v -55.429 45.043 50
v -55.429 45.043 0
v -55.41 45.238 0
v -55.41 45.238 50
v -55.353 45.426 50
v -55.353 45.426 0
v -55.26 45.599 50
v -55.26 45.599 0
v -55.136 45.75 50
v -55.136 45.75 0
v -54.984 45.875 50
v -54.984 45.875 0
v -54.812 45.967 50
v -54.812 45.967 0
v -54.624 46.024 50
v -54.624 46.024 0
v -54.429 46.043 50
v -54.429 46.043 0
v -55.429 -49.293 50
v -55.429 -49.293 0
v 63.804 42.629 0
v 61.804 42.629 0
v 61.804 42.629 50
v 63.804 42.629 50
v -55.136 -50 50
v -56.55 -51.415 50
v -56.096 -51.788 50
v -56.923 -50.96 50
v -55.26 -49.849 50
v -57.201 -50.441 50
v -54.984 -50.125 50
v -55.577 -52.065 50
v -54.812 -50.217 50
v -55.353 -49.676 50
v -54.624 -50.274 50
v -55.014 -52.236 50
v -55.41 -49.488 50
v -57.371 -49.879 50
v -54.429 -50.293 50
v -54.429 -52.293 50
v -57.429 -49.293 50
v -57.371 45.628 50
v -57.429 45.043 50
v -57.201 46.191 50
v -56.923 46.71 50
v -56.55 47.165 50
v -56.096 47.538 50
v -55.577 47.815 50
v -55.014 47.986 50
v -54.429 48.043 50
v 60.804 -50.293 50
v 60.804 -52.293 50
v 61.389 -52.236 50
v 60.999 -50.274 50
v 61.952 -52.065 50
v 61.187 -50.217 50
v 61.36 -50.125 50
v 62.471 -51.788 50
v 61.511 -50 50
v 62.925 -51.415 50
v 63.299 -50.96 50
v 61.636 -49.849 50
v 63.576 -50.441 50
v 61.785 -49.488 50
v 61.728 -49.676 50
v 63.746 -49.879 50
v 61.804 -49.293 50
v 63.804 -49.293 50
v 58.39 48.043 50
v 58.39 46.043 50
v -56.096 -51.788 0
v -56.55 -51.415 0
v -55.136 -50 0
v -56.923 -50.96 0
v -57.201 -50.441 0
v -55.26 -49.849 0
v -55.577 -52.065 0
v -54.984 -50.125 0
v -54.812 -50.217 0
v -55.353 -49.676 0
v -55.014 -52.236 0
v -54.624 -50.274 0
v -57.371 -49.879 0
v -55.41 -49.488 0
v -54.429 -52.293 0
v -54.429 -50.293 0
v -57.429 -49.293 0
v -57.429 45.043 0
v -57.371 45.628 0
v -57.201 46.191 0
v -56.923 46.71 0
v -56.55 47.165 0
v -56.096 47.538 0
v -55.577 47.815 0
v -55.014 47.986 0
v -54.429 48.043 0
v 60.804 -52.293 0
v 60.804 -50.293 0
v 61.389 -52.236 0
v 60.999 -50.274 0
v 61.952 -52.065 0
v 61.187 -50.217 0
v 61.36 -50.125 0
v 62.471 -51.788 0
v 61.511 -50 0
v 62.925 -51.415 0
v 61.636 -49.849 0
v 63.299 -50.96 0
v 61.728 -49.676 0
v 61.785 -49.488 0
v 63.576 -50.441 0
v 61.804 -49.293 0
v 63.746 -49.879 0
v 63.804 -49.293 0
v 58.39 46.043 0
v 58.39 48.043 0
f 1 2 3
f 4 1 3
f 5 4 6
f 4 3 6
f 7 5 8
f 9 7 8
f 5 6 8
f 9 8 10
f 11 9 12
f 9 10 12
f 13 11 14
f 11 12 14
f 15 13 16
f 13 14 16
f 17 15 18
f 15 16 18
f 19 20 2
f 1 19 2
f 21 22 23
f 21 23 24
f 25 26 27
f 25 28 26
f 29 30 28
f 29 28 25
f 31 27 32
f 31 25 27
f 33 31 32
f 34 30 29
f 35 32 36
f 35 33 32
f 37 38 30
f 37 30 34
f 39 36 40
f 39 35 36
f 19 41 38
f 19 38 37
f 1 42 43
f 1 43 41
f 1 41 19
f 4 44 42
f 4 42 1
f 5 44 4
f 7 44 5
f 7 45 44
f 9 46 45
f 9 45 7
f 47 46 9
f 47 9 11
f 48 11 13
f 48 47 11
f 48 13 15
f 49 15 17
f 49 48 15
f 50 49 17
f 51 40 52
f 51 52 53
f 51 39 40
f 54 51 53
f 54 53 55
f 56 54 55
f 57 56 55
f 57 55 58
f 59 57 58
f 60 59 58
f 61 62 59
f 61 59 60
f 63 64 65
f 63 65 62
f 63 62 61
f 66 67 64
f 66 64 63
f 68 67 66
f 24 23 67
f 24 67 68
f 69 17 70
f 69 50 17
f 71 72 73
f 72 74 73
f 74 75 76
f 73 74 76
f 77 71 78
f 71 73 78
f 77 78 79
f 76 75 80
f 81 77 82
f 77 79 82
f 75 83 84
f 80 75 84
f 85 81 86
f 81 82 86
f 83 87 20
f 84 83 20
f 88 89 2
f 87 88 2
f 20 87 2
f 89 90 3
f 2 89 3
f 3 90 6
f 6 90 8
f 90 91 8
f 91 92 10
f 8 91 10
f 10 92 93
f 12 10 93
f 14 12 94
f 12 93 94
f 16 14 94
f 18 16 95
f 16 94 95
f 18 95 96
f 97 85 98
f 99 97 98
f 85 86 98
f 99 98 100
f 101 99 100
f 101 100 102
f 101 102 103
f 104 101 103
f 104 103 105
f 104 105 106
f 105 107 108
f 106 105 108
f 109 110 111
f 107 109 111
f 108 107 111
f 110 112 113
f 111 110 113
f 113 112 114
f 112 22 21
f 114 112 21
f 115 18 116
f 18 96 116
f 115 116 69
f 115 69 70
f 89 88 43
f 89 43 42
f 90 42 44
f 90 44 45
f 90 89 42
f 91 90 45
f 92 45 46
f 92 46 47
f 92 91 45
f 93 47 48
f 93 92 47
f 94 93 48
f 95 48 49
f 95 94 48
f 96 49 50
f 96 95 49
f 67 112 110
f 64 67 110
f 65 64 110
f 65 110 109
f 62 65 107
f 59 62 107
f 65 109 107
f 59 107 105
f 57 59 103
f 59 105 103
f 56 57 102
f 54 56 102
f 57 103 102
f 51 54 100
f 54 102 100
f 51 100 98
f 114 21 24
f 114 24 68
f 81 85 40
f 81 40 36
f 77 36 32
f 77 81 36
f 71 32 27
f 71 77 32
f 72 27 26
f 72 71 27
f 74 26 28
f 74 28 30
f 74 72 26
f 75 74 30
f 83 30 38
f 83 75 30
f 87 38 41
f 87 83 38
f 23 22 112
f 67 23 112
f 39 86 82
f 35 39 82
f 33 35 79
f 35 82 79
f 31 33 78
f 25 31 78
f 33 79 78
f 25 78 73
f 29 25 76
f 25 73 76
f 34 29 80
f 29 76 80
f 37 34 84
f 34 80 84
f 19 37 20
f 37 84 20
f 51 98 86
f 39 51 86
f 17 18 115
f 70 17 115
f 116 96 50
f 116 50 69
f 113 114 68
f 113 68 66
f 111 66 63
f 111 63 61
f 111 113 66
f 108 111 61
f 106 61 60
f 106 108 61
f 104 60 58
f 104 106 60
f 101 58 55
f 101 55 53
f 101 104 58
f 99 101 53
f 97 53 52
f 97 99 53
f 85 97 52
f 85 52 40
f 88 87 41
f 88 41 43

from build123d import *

# Parameters (mm, degrees)
SHEET_EXTRUDE_1_1_DEPTH = 50
THICKEN_1_T1            = 2
SHEET_METAL_1_DEPTH     = 50
SHEET_METAL_1_2_DEPTH   = 50


# Read off the part's stored shape, not the designer's step: Преобразовать-Твердое тело1
with BuildPart() as body_1:
    # Sheet Extrude 1: a surface, the sketch's curves swept straight by 50 mm
    with BuildLine(Plane.XY, mode=Mode.PRIVATE) as sheet_extrude_1_1_path:
        Line((-55.428908385, 46.043182684), (61.804118295, 46.043182684))
        Line((61.804118295, 46.043182684), (61.804118295, -50.293322624))
        Line((61.804118295, -50.293322624), (-55.428908385, -50.293322624))
        Line((-55.428908385, -50.293322624), (-55.428908385, 46.043182684))
    sheet_extrude_1_1 = Shell.extrude(sheet_extrude_1_1_path.wire(), (0 * SHEET_EXTRUDE_1_1_DEPTH, 0 * SHEET_EXTRUDE_1_1_DEPTH, 1 * SHEET_EXTRUDE_1_1_DEPTH))
    add(Solid.thicken(sheet_extrude_1_1, THICKEN_1_T1))

    # Sheet Metal 1 outline → Sheet Metal 1 (cut)
    with BuildSketch(Plane.XY):
        Polygon((61.804118295, 46.043182684), (61.804118295, 42.628969122), (63.804118295, 42.628969122), (63.804118295, 48.043182684), (58.389904733, 48.043182684), (58.389904733, 46.043182684), align=None)
        with BuildLine():
            Line((63.804118295, -52.293322624), (63.804118295, -49.293322624))
            ThreePointArc((63.804118295, -49.293322624), (62.925438639, -51.414642968), (60.804118295, -52.293322624))
            Line((60.804118295, -52.293322624), (63.804118295, -52.293322624))
        make_face()
        with BuildLine():
            Line((-57.428908385, -52.293322624), (-54.428908385, -52.293322624))
            ThreePointArc((-54.428908385, -52.293322624), (-56.550228729, -51.414642968), (-57.428908385, -49.293322624))
            Line((-57.428908385, -49.293322624), (-57.428908385, -52.293322624))
        make_face()
        with BuildLine():
            ThreePointArc((-57.428908385, 45.043182684), (-56.550228729, 47.164503028), (-54.428908385, 48.043182684))
            Line((-54.428908385, 48.043182684), (-57.428908385, 48.043182684))
            Line((-57.428908385, 48.043182684), (-57.428908385, 45.043182684))
        make_face()
    extrude(amount=SHEET_METAL_1_DEPTH, mode=Mode.SUBTRACT)

    # Sheet Metal 1 2 outline → Sheet Metal 1 2 (add)
    with BuildSketch(Plane.XY):
        with BuildLine():
            Line((61.804118295, -50.293322624), (61.804118295, -49.293322624))
            ThreePointArc((61.804118295, -49.293322624), (61.511225076, -50.000429405), (60.804118295, -50.293322624))
            Line((60.804118295, -50.293322624), (61.804118295, -50.293322624))
        make_face()
        with BuildLine():
            Line((-55.428908385, -50.293322624), (-54.428908385, -50.293322624))
            ThreePointArc((-54.428908385, -50.293322624), (-55.136015166, -50.000429405), (-55.428908385, -49.293322624))
            Line((-55.428908385, -49.293322624), (-55.428908385, -50.293322624))
        make_face()
        with BuildLine():
            ThreePointArc((-55.428908385, 45.043182684), (-55.136015166, 45.750289465), (-54.428908385, 46.043182684))
            Line((-54.428908385, 46.043182684), (-55.428908385, 46.043182684))
            Line((-55.428908385, 46.043182684), (-55.428908385, 45.043182684))
        make_face()
    extrude(amount=SHEET_METAL_1_2_DEPTH)


solid = body_1.part
